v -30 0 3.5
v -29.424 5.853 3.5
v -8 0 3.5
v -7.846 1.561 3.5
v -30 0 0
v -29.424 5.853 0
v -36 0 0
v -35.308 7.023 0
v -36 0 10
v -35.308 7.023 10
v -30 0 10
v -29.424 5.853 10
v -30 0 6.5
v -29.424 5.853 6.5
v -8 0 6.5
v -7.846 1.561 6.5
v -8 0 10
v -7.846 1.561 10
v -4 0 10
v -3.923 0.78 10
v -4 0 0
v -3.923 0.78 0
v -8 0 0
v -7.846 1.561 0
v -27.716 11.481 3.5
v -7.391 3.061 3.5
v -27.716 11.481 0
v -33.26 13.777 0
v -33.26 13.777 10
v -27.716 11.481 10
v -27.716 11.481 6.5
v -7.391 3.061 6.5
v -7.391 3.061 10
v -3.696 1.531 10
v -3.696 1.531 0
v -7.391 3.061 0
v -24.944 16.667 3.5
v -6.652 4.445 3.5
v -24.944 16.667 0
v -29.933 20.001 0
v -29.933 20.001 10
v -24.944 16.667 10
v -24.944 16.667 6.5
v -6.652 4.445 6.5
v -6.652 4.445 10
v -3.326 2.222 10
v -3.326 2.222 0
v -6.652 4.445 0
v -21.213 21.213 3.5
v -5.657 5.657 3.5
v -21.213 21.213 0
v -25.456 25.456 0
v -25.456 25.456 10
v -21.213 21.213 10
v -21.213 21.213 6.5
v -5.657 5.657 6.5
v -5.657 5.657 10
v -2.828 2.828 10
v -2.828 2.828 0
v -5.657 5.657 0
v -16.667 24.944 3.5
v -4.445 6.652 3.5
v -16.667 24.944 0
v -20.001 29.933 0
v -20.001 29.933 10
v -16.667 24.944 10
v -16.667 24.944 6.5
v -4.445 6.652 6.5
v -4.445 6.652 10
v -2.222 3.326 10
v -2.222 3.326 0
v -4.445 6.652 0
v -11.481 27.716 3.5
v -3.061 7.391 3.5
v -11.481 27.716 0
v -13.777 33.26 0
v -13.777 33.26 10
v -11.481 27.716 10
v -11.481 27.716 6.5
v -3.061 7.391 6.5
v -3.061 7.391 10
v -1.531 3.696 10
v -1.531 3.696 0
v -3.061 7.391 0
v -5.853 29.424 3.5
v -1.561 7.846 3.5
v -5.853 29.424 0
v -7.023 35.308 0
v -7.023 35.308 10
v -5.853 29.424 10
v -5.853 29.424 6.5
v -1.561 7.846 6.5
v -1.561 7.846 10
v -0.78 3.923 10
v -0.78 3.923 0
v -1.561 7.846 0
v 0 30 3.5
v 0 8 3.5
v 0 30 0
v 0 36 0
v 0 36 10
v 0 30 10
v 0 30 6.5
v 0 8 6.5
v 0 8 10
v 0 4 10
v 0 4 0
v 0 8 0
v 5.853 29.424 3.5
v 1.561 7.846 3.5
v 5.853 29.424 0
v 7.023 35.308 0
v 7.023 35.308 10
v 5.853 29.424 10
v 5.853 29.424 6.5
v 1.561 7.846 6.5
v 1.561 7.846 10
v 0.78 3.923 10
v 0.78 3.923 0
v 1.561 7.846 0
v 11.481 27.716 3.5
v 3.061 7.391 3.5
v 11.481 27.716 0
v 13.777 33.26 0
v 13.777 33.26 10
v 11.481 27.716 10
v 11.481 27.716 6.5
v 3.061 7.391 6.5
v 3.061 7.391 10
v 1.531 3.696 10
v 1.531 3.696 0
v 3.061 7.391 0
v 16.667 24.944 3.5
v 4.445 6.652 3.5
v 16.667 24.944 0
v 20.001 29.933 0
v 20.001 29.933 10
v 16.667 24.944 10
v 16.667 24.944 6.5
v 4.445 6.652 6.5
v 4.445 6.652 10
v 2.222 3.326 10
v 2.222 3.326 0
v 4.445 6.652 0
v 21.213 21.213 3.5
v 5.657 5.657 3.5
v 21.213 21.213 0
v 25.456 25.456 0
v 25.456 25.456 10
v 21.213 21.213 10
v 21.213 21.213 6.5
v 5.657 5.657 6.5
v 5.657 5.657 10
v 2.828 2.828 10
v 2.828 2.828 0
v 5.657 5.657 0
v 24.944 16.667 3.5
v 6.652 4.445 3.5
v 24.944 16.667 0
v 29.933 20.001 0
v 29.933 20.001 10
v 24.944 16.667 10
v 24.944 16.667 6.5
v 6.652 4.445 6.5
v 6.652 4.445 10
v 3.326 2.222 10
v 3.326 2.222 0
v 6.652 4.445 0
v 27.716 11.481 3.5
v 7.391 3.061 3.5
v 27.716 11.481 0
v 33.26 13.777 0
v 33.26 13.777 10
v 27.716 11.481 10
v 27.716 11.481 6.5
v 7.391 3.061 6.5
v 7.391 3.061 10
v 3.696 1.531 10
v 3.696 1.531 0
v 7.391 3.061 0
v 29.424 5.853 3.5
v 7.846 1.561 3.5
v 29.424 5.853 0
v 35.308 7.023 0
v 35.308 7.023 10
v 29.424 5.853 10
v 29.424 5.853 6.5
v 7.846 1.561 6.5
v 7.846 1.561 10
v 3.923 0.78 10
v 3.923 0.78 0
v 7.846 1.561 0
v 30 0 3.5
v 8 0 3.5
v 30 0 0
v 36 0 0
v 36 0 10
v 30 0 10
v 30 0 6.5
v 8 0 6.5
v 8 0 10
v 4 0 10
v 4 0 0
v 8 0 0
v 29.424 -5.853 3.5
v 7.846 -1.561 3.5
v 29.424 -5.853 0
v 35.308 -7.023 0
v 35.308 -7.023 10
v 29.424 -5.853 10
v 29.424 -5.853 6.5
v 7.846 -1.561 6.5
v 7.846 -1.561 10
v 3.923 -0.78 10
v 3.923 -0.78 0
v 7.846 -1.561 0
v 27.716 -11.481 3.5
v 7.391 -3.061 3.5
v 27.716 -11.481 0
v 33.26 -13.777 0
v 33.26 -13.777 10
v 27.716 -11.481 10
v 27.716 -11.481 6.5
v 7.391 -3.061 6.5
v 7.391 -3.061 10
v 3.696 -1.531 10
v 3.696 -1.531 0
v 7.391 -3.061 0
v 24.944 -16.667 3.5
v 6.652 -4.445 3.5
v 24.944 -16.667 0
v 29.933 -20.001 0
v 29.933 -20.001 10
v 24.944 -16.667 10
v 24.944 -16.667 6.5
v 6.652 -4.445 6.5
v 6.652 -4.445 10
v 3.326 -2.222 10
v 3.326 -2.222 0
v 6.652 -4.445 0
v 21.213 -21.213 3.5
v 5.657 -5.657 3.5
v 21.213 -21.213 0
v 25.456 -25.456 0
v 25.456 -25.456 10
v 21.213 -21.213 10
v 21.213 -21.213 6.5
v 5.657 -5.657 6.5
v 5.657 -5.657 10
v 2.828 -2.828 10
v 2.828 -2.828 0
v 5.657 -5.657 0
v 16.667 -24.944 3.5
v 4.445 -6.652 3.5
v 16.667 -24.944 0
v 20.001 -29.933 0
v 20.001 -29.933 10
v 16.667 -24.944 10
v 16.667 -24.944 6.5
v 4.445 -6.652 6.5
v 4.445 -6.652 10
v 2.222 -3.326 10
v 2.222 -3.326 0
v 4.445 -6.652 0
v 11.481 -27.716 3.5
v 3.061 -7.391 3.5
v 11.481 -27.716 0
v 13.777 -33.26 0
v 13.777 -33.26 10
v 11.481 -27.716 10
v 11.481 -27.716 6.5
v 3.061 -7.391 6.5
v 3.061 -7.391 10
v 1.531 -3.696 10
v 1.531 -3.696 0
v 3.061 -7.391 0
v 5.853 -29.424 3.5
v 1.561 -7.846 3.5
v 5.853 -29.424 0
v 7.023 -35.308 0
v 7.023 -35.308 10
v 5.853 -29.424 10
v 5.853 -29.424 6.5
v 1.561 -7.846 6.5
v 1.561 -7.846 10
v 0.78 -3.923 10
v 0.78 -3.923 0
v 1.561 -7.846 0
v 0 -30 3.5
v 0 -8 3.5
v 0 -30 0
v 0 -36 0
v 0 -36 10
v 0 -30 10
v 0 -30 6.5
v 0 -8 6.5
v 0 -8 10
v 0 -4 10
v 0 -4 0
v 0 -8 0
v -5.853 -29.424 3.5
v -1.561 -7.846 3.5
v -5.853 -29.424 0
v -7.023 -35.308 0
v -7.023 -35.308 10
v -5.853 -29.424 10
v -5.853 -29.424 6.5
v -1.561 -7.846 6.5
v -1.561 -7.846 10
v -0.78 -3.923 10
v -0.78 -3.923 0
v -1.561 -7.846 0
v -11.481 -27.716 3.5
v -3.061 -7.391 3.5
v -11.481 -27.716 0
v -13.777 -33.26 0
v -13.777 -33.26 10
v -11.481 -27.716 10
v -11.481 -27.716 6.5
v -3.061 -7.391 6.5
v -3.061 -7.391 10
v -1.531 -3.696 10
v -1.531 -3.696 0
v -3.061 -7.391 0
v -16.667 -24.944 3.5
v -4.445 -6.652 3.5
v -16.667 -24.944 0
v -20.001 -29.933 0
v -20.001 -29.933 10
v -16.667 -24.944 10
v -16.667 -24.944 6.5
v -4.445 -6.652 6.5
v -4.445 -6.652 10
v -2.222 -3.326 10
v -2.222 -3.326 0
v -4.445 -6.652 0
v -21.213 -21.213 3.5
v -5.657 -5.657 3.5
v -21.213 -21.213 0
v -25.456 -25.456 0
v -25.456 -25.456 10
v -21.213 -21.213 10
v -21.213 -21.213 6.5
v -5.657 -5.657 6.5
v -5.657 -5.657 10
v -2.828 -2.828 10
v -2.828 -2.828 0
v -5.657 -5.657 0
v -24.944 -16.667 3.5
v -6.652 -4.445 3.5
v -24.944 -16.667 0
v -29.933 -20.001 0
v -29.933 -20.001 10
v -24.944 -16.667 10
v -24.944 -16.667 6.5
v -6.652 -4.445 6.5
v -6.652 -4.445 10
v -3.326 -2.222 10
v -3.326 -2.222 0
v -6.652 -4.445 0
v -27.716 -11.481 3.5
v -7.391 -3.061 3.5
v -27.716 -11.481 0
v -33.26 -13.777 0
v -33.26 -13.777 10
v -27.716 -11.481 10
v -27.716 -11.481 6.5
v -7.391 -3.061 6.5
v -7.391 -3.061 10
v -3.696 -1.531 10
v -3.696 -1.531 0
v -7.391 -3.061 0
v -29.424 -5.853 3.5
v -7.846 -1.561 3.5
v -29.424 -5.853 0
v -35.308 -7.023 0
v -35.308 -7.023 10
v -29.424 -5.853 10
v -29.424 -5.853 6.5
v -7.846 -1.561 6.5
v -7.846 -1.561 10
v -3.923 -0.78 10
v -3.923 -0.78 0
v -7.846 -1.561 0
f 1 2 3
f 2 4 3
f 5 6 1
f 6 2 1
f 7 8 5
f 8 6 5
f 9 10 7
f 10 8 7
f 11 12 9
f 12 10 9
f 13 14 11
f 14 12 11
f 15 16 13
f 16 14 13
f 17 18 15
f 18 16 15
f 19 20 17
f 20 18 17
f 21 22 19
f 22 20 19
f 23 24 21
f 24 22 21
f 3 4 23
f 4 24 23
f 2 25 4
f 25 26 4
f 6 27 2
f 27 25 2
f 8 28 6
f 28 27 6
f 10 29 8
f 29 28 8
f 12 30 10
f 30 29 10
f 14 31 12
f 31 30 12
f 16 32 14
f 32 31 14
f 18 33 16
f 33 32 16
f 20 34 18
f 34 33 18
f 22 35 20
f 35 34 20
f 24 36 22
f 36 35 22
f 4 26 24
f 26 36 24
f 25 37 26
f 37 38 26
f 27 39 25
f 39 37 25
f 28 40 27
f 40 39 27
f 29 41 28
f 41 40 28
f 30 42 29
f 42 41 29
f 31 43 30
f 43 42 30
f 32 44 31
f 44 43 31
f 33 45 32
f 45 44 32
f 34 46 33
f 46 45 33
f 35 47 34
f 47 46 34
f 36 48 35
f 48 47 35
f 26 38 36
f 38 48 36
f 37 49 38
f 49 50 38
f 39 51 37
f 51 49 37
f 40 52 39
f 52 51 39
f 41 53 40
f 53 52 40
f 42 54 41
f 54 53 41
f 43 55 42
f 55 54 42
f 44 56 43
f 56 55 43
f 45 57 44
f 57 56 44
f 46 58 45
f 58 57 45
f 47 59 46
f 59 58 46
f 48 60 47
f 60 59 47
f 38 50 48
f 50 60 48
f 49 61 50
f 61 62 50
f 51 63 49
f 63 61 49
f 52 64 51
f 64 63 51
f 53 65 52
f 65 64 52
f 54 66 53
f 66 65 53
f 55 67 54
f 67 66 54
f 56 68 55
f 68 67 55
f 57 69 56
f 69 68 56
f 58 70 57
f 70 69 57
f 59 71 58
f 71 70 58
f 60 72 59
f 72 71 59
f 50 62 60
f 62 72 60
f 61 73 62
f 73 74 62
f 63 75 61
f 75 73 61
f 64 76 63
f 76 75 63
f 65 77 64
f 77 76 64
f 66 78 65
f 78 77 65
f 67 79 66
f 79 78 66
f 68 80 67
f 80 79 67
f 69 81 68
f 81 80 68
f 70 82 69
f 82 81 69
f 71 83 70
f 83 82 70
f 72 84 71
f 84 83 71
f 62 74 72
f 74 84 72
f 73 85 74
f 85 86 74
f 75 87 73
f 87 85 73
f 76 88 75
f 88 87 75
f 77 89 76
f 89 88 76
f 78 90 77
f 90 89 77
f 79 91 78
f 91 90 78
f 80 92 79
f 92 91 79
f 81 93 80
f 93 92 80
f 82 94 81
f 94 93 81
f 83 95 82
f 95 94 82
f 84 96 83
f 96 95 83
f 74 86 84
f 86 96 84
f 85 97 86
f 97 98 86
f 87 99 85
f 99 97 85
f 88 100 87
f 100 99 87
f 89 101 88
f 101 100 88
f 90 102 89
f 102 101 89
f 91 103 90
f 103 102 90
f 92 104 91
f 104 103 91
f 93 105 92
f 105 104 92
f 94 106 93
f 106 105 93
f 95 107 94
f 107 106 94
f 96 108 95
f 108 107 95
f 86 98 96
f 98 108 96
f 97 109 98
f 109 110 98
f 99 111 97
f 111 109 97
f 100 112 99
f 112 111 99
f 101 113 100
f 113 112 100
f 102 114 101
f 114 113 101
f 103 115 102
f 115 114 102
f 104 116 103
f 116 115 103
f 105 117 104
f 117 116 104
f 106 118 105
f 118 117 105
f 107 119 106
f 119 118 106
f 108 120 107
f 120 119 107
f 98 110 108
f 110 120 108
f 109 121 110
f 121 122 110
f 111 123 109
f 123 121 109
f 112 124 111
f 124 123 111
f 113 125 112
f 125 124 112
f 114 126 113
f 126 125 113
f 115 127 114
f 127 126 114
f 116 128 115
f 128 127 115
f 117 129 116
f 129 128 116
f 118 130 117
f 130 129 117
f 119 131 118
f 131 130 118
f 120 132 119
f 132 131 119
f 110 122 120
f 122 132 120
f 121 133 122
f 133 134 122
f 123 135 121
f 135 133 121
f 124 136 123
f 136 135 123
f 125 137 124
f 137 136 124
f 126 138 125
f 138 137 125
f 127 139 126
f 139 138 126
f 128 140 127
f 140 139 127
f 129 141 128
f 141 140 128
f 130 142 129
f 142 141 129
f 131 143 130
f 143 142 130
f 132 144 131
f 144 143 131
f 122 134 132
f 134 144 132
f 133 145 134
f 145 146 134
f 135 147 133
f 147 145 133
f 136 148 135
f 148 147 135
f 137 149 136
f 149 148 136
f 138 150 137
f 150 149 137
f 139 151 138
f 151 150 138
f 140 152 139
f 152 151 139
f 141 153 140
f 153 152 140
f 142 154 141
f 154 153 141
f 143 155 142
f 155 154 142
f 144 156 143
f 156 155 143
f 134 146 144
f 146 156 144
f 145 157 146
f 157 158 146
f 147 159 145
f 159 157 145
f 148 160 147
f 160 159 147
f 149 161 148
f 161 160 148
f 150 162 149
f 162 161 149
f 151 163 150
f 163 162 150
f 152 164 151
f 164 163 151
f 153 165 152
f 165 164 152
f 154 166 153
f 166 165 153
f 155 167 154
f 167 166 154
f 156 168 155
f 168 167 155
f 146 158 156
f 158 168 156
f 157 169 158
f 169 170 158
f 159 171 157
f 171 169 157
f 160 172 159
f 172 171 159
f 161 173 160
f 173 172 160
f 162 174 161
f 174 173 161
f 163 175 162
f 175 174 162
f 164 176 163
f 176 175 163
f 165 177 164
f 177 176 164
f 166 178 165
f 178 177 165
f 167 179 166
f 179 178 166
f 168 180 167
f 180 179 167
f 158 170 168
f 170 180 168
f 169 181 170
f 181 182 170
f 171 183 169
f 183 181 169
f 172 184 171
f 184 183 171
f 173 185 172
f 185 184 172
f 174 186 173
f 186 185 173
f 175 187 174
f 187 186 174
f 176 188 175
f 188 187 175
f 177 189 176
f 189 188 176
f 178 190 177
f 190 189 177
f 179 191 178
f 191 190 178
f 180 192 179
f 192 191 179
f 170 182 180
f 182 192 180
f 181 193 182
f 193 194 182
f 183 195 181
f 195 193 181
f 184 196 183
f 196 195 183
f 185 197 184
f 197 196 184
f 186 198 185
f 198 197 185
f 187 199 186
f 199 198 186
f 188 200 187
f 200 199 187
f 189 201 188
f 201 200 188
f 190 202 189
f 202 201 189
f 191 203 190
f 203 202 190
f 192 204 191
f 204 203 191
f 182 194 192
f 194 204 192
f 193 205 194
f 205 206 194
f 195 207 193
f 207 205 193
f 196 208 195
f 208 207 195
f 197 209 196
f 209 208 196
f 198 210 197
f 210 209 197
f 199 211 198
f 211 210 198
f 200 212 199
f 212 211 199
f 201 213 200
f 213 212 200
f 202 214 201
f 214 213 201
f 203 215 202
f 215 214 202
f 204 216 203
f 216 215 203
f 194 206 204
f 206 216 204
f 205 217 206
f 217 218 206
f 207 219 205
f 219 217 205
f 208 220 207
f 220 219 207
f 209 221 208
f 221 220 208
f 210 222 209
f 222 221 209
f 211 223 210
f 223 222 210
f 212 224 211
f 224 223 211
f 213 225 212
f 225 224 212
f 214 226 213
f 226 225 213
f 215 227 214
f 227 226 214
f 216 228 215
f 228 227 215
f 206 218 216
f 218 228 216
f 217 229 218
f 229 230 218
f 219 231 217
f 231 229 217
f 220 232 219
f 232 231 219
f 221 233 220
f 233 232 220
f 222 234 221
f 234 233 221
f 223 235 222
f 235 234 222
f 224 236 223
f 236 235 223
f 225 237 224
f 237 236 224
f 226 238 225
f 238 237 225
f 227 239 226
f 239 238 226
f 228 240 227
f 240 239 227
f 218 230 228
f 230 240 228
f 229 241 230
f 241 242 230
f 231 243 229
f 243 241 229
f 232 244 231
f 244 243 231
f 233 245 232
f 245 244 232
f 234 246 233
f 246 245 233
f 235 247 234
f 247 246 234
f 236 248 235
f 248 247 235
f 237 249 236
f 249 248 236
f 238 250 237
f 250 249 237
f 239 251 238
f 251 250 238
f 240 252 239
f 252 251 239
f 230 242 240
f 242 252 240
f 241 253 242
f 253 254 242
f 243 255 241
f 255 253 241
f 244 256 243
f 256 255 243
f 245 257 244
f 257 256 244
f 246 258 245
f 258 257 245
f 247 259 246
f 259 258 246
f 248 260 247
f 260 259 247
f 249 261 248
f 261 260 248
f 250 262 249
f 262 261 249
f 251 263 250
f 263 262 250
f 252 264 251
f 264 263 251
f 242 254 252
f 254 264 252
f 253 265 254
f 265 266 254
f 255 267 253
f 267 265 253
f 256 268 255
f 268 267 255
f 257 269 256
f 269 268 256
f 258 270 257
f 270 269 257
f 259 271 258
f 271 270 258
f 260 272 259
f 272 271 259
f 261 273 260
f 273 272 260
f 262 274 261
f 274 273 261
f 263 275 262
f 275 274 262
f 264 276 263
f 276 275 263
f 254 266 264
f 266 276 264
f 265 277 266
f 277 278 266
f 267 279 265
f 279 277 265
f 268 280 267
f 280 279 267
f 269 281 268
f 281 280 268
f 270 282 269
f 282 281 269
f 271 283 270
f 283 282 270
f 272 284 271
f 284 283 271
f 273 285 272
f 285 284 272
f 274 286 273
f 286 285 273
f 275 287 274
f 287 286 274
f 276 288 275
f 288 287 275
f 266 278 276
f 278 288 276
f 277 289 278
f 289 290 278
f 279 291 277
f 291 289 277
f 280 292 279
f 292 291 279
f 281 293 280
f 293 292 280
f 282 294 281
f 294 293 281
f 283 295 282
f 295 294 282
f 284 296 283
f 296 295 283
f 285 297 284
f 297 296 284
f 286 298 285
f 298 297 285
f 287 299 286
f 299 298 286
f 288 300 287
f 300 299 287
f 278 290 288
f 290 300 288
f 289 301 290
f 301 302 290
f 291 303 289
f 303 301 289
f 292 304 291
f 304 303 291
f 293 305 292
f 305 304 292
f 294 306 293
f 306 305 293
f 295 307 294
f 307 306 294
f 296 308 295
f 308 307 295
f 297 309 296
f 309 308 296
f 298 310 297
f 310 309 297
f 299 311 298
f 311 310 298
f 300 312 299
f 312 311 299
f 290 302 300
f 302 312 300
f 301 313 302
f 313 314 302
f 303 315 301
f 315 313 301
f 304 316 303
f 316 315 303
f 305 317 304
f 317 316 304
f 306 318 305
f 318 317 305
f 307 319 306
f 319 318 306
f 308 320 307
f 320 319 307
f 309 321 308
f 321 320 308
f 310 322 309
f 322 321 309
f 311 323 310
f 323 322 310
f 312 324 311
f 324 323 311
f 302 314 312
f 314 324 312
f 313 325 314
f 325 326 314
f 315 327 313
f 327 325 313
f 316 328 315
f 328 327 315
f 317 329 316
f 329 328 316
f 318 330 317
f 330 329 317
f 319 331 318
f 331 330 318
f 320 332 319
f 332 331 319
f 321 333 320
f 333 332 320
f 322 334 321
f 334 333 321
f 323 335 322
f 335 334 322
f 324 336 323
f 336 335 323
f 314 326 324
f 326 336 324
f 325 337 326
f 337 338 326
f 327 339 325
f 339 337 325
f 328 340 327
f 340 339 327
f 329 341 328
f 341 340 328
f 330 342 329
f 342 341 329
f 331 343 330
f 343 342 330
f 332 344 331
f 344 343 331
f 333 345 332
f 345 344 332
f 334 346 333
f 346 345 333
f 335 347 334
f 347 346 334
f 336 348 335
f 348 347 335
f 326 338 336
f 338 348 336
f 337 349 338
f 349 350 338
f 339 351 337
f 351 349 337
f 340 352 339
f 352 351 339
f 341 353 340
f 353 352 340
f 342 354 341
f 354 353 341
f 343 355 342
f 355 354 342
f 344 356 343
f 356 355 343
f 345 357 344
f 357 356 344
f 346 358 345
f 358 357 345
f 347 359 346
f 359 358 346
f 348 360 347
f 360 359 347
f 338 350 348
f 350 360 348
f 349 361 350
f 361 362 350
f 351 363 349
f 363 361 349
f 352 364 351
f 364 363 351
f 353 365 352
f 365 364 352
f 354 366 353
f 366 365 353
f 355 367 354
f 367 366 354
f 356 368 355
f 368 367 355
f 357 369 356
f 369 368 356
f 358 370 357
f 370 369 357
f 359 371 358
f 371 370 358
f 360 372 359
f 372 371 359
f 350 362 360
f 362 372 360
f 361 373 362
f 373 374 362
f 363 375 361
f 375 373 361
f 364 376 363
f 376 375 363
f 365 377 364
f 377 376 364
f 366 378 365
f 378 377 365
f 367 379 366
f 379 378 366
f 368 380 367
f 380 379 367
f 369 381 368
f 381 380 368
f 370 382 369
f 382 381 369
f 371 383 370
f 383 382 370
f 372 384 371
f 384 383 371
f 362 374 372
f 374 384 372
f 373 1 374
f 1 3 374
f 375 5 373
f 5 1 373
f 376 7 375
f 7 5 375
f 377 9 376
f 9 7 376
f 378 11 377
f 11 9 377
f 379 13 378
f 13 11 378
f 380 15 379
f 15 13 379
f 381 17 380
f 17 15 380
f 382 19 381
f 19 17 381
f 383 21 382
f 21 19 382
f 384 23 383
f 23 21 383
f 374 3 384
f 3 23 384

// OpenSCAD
$fn = 32;

// ----------------------------------------------------------------------
// Revolved part: handwheel R36
// ----------------------------------------------------------------------

// --- parameters (mm) ---
bore_r = 4;               // bore radius
rim_r = 36;               // rim radius
rim_w = 6;                // rim axial width
rim_t = 10;               // rim diameter height
hub_r = 8;                // hub radius
web_t = 3;                // web thickness
revolve_angle = 360;      // revolve sweep, degrees
fit_tol = 0.05;           // declared fit tolerance (prompt contract)
free_tol = 0.2;           // declared free tolerance (prompt contract)

bore_d = 2 * bore_r;
rim_d = 2 * rim_r;
hub_d = 2 * hub_r;

profile = [[4, 0], [8, 0], [8, 3.5], [30, 3.5], [30, 0], [36, 0], [36, 10], [30, 10], [30, 6.5], [8, 6.5], [8, 10], [4, 10]];  // primary outline, 12 points, counter clockwise

// --- the one profile operation ---
rotate_extrude(angle = revolve_angle) polygon(points = profile);
